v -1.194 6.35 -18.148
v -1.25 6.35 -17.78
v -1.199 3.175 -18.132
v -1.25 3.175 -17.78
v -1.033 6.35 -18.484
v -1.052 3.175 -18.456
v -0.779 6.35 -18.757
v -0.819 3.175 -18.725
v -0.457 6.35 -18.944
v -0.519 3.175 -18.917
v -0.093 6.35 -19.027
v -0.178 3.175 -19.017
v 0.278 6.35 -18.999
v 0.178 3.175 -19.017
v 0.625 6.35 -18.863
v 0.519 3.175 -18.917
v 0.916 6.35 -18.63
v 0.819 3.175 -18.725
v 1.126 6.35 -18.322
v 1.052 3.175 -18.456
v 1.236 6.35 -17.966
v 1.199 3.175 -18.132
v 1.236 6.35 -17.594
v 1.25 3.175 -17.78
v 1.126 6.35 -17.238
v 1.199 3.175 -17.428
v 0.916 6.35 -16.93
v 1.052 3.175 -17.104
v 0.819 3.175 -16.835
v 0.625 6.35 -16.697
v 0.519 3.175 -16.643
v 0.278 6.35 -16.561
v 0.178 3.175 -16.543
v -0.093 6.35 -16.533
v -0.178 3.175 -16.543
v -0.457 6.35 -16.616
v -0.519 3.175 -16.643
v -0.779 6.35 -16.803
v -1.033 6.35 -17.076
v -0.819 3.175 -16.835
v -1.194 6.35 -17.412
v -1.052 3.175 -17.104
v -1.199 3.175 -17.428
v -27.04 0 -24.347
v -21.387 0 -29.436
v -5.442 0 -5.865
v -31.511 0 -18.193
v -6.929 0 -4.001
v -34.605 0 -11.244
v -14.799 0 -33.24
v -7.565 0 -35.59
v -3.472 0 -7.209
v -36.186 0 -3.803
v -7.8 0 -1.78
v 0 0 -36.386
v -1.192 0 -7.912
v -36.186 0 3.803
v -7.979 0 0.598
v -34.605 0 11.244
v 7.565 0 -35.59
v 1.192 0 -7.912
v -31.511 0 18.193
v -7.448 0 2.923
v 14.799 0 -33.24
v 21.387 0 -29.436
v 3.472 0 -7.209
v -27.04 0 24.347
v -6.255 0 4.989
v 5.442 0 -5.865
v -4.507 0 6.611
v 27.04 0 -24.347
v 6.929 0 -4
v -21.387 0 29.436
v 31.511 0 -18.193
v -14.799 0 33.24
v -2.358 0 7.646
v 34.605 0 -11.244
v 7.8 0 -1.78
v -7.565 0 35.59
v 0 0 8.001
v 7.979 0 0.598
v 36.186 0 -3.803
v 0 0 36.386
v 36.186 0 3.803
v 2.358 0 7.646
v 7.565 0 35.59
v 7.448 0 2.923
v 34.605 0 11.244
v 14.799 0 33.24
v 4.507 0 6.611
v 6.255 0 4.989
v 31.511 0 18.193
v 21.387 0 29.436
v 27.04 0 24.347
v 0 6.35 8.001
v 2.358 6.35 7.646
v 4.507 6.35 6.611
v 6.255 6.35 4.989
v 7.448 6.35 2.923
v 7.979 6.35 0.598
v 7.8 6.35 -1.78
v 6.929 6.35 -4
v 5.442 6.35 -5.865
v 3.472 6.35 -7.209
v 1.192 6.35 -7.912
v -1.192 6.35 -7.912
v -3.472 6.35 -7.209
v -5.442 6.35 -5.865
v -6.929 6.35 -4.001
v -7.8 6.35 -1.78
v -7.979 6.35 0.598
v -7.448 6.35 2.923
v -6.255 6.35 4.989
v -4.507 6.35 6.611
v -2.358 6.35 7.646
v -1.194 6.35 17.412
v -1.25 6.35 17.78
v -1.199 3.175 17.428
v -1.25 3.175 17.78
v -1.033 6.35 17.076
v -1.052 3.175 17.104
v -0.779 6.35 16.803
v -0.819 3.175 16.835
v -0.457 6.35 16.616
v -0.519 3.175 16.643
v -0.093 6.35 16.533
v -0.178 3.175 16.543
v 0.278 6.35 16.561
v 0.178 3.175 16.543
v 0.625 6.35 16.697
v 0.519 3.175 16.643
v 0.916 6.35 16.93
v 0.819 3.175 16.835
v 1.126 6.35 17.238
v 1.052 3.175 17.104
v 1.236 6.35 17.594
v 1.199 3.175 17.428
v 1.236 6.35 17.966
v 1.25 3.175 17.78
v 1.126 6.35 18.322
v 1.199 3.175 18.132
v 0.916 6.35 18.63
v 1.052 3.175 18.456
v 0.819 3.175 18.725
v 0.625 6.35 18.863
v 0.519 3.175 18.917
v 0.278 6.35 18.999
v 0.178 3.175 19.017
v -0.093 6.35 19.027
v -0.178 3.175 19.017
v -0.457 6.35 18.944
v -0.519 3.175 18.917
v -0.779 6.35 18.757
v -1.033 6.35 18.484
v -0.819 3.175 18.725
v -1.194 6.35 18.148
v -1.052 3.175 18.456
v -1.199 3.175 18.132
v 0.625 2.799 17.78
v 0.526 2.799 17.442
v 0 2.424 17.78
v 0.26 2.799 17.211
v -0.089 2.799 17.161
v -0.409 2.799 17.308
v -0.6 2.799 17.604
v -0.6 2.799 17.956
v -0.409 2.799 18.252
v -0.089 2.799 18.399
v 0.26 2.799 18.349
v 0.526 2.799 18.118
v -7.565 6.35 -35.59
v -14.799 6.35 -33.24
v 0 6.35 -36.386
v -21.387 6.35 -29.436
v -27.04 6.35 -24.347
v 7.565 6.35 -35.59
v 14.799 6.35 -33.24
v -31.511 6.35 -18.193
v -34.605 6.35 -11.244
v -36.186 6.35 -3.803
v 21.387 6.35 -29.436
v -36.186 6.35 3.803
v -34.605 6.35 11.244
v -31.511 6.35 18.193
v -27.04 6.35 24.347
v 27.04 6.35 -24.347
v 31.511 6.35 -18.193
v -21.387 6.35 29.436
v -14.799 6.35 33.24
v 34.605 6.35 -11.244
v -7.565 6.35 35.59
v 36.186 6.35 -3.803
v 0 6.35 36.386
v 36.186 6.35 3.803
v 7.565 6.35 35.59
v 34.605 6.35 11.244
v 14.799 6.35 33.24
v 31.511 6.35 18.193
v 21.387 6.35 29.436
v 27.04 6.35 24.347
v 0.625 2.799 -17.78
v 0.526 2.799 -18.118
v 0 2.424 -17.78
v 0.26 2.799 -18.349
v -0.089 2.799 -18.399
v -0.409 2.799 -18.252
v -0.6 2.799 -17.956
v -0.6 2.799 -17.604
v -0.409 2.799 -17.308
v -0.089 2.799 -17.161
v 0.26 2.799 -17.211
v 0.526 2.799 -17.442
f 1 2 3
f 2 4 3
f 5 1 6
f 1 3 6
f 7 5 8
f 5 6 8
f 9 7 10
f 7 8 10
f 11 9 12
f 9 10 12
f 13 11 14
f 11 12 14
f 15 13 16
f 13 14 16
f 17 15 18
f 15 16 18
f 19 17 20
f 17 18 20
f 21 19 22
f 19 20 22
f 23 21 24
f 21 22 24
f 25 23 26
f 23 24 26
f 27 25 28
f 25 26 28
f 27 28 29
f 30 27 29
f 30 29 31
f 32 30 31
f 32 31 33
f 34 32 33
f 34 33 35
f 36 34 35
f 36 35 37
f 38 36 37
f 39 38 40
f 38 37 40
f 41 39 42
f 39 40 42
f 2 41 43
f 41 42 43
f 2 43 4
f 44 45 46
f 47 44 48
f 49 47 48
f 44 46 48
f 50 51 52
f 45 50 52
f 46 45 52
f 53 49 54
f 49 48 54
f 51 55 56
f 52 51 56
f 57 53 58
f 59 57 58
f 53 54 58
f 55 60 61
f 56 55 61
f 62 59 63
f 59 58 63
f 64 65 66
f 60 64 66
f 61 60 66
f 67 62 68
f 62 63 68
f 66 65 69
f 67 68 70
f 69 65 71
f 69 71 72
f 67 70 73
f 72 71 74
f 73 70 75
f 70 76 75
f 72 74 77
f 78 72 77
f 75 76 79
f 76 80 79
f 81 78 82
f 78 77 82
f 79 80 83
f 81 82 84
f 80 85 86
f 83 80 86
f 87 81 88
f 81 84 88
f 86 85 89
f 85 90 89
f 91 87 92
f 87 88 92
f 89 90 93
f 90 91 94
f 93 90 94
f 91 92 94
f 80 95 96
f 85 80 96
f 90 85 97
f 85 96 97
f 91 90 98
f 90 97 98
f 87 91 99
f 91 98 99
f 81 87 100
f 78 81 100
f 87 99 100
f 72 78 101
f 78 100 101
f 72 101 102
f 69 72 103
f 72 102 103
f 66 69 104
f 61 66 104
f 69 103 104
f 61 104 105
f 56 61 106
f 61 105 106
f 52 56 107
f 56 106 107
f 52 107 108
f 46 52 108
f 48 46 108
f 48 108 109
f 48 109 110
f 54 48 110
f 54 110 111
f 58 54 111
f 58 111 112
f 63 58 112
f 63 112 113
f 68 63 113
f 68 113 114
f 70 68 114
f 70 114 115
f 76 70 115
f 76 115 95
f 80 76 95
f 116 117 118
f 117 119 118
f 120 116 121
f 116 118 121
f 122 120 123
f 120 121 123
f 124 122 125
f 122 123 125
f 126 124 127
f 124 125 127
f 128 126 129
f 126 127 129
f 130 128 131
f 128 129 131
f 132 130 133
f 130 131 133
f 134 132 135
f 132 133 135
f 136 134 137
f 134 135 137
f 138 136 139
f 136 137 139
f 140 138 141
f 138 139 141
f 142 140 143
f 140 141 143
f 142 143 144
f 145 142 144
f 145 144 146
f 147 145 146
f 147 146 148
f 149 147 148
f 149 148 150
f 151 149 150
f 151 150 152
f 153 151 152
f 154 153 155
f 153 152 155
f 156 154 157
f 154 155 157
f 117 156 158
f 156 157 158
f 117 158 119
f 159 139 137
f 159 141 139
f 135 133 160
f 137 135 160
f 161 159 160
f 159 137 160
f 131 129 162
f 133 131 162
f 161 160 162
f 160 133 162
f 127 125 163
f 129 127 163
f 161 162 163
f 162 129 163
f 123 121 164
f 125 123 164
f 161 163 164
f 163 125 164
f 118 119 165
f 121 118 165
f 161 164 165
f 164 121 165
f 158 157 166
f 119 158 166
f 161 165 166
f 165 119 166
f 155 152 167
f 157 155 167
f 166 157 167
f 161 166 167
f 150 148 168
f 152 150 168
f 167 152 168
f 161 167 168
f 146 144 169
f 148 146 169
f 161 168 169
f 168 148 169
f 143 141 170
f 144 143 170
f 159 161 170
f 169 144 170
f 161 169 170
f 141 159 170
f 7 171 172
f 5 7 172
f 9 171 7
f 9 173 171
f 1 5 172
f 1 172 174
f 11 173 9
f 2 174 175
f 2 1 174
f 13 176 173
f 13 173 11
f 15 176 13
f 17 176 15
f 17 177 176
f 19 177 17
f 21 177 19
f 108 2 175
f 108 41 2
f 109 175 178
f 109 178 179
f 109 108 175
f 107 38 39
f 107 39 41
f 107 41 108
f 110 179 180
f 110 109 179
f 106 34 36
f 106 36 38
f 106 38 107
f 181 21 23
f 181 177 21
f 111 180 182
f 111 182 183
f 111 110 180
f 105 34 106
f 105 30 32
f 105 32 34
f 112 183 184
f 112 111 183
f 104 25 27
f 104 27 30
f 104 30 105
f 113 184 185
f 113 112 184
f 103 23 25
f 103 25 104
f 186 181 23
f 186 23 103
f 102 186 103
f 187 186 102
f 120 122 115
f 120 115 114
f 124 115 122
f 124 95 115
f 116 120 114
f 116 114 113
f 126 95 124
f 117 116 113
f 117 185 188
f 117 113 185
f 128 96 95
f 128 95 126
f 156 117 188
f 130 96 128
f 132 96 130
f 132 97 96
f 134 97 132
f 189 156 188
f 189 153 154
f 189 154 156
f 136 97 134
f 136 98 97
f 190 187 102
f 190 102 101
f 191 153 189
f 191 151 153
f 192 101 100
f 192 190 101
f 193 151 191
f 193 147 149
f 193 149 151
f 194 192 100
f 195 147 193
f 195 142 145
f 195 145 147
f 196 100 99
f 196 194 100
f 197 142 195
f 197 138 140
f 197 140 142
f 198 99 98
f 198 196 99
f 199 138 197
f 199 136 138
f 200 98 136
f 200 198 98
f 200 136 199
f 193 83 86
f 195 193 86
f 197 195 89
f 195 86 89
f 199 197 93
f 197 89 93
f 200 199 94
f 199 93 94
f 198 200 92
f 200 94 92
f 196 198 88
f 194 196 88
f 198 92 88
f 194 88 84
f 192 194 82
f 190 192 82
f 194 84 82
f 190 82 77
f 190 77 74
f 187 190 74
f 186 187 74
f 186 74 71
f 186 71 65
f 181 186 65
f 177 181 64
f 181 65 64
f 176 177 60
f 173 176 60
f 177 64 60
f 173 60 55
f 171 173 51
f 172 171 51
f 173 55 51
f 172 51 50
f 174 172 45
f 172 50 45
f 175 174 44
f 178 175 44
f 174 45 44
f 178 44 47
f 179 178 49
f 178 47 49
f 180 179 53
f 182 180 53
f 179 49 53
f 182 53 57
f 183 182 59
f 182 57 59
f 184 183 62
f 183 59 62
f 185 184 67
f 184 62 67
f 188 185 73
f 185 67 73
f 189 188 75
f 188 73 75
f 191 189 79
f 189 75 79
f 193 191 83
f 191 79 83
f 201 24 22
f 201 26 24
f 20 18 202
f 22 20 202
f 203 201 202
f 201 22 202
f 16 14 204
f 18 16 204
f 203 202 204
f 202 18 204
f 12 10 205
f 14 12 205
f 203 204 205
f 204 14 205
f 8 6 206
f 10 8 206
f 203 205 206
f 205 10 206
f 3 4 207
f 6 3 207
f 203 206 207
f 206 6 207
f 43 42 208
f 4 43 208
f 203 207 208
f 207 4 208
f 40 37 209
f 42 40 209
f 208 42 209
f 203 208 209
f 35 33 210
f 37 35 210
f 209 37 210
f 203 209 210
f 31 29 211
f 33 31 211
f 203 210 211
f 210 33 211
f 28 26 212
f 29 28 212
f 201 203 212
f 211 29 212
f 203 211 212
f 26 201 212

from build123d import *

# Parameters (mm, degrees)
SKETCH1_R                       = 36.3855
BOSS_EXTRUDE1_DEPTH             = 6.35
TAP_DRILL_FOR_M3X0_5_TAP2_D     = 2.5
TAP_DRILL_FOR_M3X0_5_TAP2_DEPTH = 3.175
TAP_DRILL_FOR_M3X0_5_TAP2_TIP   = 0.751075774
SKETCH7_R                       = 8.001
CUT_EXTRUDE1_DEPTH              = 52.847195879


with BuildPart() as part:
    # Sketch1 → Boss-Extrude1 (new body)
    with BuildSketch(Plane(origin=(0, 0, 0), x_dir=(1, 0, 0), z_dir=(0, 1, 0))):
        with Locations(Location((0, 0, 0), (0, 0, 270))):
            Circle(SKETCH1_R)
    extrude(amount=BOSS_EXTRUDE1_DEPTH)

    # Tap Drill for M3x0.5 Tap2
    with Locations(Plane(origin=(0, 6.35, 0), x_dir=(1, 0, 0), z_dir=(0, 1, 0))):
        with Locations((0, 17.78), (0, -17.78)):
            Hole(TAP_DRILL_FOR_M3X0_5_TAP2_D / 2, depth=TAP_DRILL_FOR_M3X0_5_TAP2_DEPTH)
            with Locations((0, 0, -(TAP_DRILL_FOR_M3X0_5_TAP2_DEPTH + TAP_DRILL_FOR_M3X0_5_TAP2_TIP / 2))):  # 118° drill point
                Cone(0, TAP_DRILL_FOR_M3X0_5_TAP2_D / 2, TAP_DRILL_FOR_M3X0_5_TAP2_TIP, mode=Mode.SUBTRACT)

    # Sketch7 → Cut-Extrude1 (cut, through all)
    with BuildSketch(Plane(origin=(0, 6.35, 0), x_dir=(1, 0, 0), z_dir=(0, 1, 0))):
        with Locations(Location((0, 0, 0), (0, 0, 270))):
            Circle(SKETCH7_R)
    extrude(amount=-CUT_EXTRUDE1_DEPTH, mode=Mode.SUBTRACT)


solid = part.part
